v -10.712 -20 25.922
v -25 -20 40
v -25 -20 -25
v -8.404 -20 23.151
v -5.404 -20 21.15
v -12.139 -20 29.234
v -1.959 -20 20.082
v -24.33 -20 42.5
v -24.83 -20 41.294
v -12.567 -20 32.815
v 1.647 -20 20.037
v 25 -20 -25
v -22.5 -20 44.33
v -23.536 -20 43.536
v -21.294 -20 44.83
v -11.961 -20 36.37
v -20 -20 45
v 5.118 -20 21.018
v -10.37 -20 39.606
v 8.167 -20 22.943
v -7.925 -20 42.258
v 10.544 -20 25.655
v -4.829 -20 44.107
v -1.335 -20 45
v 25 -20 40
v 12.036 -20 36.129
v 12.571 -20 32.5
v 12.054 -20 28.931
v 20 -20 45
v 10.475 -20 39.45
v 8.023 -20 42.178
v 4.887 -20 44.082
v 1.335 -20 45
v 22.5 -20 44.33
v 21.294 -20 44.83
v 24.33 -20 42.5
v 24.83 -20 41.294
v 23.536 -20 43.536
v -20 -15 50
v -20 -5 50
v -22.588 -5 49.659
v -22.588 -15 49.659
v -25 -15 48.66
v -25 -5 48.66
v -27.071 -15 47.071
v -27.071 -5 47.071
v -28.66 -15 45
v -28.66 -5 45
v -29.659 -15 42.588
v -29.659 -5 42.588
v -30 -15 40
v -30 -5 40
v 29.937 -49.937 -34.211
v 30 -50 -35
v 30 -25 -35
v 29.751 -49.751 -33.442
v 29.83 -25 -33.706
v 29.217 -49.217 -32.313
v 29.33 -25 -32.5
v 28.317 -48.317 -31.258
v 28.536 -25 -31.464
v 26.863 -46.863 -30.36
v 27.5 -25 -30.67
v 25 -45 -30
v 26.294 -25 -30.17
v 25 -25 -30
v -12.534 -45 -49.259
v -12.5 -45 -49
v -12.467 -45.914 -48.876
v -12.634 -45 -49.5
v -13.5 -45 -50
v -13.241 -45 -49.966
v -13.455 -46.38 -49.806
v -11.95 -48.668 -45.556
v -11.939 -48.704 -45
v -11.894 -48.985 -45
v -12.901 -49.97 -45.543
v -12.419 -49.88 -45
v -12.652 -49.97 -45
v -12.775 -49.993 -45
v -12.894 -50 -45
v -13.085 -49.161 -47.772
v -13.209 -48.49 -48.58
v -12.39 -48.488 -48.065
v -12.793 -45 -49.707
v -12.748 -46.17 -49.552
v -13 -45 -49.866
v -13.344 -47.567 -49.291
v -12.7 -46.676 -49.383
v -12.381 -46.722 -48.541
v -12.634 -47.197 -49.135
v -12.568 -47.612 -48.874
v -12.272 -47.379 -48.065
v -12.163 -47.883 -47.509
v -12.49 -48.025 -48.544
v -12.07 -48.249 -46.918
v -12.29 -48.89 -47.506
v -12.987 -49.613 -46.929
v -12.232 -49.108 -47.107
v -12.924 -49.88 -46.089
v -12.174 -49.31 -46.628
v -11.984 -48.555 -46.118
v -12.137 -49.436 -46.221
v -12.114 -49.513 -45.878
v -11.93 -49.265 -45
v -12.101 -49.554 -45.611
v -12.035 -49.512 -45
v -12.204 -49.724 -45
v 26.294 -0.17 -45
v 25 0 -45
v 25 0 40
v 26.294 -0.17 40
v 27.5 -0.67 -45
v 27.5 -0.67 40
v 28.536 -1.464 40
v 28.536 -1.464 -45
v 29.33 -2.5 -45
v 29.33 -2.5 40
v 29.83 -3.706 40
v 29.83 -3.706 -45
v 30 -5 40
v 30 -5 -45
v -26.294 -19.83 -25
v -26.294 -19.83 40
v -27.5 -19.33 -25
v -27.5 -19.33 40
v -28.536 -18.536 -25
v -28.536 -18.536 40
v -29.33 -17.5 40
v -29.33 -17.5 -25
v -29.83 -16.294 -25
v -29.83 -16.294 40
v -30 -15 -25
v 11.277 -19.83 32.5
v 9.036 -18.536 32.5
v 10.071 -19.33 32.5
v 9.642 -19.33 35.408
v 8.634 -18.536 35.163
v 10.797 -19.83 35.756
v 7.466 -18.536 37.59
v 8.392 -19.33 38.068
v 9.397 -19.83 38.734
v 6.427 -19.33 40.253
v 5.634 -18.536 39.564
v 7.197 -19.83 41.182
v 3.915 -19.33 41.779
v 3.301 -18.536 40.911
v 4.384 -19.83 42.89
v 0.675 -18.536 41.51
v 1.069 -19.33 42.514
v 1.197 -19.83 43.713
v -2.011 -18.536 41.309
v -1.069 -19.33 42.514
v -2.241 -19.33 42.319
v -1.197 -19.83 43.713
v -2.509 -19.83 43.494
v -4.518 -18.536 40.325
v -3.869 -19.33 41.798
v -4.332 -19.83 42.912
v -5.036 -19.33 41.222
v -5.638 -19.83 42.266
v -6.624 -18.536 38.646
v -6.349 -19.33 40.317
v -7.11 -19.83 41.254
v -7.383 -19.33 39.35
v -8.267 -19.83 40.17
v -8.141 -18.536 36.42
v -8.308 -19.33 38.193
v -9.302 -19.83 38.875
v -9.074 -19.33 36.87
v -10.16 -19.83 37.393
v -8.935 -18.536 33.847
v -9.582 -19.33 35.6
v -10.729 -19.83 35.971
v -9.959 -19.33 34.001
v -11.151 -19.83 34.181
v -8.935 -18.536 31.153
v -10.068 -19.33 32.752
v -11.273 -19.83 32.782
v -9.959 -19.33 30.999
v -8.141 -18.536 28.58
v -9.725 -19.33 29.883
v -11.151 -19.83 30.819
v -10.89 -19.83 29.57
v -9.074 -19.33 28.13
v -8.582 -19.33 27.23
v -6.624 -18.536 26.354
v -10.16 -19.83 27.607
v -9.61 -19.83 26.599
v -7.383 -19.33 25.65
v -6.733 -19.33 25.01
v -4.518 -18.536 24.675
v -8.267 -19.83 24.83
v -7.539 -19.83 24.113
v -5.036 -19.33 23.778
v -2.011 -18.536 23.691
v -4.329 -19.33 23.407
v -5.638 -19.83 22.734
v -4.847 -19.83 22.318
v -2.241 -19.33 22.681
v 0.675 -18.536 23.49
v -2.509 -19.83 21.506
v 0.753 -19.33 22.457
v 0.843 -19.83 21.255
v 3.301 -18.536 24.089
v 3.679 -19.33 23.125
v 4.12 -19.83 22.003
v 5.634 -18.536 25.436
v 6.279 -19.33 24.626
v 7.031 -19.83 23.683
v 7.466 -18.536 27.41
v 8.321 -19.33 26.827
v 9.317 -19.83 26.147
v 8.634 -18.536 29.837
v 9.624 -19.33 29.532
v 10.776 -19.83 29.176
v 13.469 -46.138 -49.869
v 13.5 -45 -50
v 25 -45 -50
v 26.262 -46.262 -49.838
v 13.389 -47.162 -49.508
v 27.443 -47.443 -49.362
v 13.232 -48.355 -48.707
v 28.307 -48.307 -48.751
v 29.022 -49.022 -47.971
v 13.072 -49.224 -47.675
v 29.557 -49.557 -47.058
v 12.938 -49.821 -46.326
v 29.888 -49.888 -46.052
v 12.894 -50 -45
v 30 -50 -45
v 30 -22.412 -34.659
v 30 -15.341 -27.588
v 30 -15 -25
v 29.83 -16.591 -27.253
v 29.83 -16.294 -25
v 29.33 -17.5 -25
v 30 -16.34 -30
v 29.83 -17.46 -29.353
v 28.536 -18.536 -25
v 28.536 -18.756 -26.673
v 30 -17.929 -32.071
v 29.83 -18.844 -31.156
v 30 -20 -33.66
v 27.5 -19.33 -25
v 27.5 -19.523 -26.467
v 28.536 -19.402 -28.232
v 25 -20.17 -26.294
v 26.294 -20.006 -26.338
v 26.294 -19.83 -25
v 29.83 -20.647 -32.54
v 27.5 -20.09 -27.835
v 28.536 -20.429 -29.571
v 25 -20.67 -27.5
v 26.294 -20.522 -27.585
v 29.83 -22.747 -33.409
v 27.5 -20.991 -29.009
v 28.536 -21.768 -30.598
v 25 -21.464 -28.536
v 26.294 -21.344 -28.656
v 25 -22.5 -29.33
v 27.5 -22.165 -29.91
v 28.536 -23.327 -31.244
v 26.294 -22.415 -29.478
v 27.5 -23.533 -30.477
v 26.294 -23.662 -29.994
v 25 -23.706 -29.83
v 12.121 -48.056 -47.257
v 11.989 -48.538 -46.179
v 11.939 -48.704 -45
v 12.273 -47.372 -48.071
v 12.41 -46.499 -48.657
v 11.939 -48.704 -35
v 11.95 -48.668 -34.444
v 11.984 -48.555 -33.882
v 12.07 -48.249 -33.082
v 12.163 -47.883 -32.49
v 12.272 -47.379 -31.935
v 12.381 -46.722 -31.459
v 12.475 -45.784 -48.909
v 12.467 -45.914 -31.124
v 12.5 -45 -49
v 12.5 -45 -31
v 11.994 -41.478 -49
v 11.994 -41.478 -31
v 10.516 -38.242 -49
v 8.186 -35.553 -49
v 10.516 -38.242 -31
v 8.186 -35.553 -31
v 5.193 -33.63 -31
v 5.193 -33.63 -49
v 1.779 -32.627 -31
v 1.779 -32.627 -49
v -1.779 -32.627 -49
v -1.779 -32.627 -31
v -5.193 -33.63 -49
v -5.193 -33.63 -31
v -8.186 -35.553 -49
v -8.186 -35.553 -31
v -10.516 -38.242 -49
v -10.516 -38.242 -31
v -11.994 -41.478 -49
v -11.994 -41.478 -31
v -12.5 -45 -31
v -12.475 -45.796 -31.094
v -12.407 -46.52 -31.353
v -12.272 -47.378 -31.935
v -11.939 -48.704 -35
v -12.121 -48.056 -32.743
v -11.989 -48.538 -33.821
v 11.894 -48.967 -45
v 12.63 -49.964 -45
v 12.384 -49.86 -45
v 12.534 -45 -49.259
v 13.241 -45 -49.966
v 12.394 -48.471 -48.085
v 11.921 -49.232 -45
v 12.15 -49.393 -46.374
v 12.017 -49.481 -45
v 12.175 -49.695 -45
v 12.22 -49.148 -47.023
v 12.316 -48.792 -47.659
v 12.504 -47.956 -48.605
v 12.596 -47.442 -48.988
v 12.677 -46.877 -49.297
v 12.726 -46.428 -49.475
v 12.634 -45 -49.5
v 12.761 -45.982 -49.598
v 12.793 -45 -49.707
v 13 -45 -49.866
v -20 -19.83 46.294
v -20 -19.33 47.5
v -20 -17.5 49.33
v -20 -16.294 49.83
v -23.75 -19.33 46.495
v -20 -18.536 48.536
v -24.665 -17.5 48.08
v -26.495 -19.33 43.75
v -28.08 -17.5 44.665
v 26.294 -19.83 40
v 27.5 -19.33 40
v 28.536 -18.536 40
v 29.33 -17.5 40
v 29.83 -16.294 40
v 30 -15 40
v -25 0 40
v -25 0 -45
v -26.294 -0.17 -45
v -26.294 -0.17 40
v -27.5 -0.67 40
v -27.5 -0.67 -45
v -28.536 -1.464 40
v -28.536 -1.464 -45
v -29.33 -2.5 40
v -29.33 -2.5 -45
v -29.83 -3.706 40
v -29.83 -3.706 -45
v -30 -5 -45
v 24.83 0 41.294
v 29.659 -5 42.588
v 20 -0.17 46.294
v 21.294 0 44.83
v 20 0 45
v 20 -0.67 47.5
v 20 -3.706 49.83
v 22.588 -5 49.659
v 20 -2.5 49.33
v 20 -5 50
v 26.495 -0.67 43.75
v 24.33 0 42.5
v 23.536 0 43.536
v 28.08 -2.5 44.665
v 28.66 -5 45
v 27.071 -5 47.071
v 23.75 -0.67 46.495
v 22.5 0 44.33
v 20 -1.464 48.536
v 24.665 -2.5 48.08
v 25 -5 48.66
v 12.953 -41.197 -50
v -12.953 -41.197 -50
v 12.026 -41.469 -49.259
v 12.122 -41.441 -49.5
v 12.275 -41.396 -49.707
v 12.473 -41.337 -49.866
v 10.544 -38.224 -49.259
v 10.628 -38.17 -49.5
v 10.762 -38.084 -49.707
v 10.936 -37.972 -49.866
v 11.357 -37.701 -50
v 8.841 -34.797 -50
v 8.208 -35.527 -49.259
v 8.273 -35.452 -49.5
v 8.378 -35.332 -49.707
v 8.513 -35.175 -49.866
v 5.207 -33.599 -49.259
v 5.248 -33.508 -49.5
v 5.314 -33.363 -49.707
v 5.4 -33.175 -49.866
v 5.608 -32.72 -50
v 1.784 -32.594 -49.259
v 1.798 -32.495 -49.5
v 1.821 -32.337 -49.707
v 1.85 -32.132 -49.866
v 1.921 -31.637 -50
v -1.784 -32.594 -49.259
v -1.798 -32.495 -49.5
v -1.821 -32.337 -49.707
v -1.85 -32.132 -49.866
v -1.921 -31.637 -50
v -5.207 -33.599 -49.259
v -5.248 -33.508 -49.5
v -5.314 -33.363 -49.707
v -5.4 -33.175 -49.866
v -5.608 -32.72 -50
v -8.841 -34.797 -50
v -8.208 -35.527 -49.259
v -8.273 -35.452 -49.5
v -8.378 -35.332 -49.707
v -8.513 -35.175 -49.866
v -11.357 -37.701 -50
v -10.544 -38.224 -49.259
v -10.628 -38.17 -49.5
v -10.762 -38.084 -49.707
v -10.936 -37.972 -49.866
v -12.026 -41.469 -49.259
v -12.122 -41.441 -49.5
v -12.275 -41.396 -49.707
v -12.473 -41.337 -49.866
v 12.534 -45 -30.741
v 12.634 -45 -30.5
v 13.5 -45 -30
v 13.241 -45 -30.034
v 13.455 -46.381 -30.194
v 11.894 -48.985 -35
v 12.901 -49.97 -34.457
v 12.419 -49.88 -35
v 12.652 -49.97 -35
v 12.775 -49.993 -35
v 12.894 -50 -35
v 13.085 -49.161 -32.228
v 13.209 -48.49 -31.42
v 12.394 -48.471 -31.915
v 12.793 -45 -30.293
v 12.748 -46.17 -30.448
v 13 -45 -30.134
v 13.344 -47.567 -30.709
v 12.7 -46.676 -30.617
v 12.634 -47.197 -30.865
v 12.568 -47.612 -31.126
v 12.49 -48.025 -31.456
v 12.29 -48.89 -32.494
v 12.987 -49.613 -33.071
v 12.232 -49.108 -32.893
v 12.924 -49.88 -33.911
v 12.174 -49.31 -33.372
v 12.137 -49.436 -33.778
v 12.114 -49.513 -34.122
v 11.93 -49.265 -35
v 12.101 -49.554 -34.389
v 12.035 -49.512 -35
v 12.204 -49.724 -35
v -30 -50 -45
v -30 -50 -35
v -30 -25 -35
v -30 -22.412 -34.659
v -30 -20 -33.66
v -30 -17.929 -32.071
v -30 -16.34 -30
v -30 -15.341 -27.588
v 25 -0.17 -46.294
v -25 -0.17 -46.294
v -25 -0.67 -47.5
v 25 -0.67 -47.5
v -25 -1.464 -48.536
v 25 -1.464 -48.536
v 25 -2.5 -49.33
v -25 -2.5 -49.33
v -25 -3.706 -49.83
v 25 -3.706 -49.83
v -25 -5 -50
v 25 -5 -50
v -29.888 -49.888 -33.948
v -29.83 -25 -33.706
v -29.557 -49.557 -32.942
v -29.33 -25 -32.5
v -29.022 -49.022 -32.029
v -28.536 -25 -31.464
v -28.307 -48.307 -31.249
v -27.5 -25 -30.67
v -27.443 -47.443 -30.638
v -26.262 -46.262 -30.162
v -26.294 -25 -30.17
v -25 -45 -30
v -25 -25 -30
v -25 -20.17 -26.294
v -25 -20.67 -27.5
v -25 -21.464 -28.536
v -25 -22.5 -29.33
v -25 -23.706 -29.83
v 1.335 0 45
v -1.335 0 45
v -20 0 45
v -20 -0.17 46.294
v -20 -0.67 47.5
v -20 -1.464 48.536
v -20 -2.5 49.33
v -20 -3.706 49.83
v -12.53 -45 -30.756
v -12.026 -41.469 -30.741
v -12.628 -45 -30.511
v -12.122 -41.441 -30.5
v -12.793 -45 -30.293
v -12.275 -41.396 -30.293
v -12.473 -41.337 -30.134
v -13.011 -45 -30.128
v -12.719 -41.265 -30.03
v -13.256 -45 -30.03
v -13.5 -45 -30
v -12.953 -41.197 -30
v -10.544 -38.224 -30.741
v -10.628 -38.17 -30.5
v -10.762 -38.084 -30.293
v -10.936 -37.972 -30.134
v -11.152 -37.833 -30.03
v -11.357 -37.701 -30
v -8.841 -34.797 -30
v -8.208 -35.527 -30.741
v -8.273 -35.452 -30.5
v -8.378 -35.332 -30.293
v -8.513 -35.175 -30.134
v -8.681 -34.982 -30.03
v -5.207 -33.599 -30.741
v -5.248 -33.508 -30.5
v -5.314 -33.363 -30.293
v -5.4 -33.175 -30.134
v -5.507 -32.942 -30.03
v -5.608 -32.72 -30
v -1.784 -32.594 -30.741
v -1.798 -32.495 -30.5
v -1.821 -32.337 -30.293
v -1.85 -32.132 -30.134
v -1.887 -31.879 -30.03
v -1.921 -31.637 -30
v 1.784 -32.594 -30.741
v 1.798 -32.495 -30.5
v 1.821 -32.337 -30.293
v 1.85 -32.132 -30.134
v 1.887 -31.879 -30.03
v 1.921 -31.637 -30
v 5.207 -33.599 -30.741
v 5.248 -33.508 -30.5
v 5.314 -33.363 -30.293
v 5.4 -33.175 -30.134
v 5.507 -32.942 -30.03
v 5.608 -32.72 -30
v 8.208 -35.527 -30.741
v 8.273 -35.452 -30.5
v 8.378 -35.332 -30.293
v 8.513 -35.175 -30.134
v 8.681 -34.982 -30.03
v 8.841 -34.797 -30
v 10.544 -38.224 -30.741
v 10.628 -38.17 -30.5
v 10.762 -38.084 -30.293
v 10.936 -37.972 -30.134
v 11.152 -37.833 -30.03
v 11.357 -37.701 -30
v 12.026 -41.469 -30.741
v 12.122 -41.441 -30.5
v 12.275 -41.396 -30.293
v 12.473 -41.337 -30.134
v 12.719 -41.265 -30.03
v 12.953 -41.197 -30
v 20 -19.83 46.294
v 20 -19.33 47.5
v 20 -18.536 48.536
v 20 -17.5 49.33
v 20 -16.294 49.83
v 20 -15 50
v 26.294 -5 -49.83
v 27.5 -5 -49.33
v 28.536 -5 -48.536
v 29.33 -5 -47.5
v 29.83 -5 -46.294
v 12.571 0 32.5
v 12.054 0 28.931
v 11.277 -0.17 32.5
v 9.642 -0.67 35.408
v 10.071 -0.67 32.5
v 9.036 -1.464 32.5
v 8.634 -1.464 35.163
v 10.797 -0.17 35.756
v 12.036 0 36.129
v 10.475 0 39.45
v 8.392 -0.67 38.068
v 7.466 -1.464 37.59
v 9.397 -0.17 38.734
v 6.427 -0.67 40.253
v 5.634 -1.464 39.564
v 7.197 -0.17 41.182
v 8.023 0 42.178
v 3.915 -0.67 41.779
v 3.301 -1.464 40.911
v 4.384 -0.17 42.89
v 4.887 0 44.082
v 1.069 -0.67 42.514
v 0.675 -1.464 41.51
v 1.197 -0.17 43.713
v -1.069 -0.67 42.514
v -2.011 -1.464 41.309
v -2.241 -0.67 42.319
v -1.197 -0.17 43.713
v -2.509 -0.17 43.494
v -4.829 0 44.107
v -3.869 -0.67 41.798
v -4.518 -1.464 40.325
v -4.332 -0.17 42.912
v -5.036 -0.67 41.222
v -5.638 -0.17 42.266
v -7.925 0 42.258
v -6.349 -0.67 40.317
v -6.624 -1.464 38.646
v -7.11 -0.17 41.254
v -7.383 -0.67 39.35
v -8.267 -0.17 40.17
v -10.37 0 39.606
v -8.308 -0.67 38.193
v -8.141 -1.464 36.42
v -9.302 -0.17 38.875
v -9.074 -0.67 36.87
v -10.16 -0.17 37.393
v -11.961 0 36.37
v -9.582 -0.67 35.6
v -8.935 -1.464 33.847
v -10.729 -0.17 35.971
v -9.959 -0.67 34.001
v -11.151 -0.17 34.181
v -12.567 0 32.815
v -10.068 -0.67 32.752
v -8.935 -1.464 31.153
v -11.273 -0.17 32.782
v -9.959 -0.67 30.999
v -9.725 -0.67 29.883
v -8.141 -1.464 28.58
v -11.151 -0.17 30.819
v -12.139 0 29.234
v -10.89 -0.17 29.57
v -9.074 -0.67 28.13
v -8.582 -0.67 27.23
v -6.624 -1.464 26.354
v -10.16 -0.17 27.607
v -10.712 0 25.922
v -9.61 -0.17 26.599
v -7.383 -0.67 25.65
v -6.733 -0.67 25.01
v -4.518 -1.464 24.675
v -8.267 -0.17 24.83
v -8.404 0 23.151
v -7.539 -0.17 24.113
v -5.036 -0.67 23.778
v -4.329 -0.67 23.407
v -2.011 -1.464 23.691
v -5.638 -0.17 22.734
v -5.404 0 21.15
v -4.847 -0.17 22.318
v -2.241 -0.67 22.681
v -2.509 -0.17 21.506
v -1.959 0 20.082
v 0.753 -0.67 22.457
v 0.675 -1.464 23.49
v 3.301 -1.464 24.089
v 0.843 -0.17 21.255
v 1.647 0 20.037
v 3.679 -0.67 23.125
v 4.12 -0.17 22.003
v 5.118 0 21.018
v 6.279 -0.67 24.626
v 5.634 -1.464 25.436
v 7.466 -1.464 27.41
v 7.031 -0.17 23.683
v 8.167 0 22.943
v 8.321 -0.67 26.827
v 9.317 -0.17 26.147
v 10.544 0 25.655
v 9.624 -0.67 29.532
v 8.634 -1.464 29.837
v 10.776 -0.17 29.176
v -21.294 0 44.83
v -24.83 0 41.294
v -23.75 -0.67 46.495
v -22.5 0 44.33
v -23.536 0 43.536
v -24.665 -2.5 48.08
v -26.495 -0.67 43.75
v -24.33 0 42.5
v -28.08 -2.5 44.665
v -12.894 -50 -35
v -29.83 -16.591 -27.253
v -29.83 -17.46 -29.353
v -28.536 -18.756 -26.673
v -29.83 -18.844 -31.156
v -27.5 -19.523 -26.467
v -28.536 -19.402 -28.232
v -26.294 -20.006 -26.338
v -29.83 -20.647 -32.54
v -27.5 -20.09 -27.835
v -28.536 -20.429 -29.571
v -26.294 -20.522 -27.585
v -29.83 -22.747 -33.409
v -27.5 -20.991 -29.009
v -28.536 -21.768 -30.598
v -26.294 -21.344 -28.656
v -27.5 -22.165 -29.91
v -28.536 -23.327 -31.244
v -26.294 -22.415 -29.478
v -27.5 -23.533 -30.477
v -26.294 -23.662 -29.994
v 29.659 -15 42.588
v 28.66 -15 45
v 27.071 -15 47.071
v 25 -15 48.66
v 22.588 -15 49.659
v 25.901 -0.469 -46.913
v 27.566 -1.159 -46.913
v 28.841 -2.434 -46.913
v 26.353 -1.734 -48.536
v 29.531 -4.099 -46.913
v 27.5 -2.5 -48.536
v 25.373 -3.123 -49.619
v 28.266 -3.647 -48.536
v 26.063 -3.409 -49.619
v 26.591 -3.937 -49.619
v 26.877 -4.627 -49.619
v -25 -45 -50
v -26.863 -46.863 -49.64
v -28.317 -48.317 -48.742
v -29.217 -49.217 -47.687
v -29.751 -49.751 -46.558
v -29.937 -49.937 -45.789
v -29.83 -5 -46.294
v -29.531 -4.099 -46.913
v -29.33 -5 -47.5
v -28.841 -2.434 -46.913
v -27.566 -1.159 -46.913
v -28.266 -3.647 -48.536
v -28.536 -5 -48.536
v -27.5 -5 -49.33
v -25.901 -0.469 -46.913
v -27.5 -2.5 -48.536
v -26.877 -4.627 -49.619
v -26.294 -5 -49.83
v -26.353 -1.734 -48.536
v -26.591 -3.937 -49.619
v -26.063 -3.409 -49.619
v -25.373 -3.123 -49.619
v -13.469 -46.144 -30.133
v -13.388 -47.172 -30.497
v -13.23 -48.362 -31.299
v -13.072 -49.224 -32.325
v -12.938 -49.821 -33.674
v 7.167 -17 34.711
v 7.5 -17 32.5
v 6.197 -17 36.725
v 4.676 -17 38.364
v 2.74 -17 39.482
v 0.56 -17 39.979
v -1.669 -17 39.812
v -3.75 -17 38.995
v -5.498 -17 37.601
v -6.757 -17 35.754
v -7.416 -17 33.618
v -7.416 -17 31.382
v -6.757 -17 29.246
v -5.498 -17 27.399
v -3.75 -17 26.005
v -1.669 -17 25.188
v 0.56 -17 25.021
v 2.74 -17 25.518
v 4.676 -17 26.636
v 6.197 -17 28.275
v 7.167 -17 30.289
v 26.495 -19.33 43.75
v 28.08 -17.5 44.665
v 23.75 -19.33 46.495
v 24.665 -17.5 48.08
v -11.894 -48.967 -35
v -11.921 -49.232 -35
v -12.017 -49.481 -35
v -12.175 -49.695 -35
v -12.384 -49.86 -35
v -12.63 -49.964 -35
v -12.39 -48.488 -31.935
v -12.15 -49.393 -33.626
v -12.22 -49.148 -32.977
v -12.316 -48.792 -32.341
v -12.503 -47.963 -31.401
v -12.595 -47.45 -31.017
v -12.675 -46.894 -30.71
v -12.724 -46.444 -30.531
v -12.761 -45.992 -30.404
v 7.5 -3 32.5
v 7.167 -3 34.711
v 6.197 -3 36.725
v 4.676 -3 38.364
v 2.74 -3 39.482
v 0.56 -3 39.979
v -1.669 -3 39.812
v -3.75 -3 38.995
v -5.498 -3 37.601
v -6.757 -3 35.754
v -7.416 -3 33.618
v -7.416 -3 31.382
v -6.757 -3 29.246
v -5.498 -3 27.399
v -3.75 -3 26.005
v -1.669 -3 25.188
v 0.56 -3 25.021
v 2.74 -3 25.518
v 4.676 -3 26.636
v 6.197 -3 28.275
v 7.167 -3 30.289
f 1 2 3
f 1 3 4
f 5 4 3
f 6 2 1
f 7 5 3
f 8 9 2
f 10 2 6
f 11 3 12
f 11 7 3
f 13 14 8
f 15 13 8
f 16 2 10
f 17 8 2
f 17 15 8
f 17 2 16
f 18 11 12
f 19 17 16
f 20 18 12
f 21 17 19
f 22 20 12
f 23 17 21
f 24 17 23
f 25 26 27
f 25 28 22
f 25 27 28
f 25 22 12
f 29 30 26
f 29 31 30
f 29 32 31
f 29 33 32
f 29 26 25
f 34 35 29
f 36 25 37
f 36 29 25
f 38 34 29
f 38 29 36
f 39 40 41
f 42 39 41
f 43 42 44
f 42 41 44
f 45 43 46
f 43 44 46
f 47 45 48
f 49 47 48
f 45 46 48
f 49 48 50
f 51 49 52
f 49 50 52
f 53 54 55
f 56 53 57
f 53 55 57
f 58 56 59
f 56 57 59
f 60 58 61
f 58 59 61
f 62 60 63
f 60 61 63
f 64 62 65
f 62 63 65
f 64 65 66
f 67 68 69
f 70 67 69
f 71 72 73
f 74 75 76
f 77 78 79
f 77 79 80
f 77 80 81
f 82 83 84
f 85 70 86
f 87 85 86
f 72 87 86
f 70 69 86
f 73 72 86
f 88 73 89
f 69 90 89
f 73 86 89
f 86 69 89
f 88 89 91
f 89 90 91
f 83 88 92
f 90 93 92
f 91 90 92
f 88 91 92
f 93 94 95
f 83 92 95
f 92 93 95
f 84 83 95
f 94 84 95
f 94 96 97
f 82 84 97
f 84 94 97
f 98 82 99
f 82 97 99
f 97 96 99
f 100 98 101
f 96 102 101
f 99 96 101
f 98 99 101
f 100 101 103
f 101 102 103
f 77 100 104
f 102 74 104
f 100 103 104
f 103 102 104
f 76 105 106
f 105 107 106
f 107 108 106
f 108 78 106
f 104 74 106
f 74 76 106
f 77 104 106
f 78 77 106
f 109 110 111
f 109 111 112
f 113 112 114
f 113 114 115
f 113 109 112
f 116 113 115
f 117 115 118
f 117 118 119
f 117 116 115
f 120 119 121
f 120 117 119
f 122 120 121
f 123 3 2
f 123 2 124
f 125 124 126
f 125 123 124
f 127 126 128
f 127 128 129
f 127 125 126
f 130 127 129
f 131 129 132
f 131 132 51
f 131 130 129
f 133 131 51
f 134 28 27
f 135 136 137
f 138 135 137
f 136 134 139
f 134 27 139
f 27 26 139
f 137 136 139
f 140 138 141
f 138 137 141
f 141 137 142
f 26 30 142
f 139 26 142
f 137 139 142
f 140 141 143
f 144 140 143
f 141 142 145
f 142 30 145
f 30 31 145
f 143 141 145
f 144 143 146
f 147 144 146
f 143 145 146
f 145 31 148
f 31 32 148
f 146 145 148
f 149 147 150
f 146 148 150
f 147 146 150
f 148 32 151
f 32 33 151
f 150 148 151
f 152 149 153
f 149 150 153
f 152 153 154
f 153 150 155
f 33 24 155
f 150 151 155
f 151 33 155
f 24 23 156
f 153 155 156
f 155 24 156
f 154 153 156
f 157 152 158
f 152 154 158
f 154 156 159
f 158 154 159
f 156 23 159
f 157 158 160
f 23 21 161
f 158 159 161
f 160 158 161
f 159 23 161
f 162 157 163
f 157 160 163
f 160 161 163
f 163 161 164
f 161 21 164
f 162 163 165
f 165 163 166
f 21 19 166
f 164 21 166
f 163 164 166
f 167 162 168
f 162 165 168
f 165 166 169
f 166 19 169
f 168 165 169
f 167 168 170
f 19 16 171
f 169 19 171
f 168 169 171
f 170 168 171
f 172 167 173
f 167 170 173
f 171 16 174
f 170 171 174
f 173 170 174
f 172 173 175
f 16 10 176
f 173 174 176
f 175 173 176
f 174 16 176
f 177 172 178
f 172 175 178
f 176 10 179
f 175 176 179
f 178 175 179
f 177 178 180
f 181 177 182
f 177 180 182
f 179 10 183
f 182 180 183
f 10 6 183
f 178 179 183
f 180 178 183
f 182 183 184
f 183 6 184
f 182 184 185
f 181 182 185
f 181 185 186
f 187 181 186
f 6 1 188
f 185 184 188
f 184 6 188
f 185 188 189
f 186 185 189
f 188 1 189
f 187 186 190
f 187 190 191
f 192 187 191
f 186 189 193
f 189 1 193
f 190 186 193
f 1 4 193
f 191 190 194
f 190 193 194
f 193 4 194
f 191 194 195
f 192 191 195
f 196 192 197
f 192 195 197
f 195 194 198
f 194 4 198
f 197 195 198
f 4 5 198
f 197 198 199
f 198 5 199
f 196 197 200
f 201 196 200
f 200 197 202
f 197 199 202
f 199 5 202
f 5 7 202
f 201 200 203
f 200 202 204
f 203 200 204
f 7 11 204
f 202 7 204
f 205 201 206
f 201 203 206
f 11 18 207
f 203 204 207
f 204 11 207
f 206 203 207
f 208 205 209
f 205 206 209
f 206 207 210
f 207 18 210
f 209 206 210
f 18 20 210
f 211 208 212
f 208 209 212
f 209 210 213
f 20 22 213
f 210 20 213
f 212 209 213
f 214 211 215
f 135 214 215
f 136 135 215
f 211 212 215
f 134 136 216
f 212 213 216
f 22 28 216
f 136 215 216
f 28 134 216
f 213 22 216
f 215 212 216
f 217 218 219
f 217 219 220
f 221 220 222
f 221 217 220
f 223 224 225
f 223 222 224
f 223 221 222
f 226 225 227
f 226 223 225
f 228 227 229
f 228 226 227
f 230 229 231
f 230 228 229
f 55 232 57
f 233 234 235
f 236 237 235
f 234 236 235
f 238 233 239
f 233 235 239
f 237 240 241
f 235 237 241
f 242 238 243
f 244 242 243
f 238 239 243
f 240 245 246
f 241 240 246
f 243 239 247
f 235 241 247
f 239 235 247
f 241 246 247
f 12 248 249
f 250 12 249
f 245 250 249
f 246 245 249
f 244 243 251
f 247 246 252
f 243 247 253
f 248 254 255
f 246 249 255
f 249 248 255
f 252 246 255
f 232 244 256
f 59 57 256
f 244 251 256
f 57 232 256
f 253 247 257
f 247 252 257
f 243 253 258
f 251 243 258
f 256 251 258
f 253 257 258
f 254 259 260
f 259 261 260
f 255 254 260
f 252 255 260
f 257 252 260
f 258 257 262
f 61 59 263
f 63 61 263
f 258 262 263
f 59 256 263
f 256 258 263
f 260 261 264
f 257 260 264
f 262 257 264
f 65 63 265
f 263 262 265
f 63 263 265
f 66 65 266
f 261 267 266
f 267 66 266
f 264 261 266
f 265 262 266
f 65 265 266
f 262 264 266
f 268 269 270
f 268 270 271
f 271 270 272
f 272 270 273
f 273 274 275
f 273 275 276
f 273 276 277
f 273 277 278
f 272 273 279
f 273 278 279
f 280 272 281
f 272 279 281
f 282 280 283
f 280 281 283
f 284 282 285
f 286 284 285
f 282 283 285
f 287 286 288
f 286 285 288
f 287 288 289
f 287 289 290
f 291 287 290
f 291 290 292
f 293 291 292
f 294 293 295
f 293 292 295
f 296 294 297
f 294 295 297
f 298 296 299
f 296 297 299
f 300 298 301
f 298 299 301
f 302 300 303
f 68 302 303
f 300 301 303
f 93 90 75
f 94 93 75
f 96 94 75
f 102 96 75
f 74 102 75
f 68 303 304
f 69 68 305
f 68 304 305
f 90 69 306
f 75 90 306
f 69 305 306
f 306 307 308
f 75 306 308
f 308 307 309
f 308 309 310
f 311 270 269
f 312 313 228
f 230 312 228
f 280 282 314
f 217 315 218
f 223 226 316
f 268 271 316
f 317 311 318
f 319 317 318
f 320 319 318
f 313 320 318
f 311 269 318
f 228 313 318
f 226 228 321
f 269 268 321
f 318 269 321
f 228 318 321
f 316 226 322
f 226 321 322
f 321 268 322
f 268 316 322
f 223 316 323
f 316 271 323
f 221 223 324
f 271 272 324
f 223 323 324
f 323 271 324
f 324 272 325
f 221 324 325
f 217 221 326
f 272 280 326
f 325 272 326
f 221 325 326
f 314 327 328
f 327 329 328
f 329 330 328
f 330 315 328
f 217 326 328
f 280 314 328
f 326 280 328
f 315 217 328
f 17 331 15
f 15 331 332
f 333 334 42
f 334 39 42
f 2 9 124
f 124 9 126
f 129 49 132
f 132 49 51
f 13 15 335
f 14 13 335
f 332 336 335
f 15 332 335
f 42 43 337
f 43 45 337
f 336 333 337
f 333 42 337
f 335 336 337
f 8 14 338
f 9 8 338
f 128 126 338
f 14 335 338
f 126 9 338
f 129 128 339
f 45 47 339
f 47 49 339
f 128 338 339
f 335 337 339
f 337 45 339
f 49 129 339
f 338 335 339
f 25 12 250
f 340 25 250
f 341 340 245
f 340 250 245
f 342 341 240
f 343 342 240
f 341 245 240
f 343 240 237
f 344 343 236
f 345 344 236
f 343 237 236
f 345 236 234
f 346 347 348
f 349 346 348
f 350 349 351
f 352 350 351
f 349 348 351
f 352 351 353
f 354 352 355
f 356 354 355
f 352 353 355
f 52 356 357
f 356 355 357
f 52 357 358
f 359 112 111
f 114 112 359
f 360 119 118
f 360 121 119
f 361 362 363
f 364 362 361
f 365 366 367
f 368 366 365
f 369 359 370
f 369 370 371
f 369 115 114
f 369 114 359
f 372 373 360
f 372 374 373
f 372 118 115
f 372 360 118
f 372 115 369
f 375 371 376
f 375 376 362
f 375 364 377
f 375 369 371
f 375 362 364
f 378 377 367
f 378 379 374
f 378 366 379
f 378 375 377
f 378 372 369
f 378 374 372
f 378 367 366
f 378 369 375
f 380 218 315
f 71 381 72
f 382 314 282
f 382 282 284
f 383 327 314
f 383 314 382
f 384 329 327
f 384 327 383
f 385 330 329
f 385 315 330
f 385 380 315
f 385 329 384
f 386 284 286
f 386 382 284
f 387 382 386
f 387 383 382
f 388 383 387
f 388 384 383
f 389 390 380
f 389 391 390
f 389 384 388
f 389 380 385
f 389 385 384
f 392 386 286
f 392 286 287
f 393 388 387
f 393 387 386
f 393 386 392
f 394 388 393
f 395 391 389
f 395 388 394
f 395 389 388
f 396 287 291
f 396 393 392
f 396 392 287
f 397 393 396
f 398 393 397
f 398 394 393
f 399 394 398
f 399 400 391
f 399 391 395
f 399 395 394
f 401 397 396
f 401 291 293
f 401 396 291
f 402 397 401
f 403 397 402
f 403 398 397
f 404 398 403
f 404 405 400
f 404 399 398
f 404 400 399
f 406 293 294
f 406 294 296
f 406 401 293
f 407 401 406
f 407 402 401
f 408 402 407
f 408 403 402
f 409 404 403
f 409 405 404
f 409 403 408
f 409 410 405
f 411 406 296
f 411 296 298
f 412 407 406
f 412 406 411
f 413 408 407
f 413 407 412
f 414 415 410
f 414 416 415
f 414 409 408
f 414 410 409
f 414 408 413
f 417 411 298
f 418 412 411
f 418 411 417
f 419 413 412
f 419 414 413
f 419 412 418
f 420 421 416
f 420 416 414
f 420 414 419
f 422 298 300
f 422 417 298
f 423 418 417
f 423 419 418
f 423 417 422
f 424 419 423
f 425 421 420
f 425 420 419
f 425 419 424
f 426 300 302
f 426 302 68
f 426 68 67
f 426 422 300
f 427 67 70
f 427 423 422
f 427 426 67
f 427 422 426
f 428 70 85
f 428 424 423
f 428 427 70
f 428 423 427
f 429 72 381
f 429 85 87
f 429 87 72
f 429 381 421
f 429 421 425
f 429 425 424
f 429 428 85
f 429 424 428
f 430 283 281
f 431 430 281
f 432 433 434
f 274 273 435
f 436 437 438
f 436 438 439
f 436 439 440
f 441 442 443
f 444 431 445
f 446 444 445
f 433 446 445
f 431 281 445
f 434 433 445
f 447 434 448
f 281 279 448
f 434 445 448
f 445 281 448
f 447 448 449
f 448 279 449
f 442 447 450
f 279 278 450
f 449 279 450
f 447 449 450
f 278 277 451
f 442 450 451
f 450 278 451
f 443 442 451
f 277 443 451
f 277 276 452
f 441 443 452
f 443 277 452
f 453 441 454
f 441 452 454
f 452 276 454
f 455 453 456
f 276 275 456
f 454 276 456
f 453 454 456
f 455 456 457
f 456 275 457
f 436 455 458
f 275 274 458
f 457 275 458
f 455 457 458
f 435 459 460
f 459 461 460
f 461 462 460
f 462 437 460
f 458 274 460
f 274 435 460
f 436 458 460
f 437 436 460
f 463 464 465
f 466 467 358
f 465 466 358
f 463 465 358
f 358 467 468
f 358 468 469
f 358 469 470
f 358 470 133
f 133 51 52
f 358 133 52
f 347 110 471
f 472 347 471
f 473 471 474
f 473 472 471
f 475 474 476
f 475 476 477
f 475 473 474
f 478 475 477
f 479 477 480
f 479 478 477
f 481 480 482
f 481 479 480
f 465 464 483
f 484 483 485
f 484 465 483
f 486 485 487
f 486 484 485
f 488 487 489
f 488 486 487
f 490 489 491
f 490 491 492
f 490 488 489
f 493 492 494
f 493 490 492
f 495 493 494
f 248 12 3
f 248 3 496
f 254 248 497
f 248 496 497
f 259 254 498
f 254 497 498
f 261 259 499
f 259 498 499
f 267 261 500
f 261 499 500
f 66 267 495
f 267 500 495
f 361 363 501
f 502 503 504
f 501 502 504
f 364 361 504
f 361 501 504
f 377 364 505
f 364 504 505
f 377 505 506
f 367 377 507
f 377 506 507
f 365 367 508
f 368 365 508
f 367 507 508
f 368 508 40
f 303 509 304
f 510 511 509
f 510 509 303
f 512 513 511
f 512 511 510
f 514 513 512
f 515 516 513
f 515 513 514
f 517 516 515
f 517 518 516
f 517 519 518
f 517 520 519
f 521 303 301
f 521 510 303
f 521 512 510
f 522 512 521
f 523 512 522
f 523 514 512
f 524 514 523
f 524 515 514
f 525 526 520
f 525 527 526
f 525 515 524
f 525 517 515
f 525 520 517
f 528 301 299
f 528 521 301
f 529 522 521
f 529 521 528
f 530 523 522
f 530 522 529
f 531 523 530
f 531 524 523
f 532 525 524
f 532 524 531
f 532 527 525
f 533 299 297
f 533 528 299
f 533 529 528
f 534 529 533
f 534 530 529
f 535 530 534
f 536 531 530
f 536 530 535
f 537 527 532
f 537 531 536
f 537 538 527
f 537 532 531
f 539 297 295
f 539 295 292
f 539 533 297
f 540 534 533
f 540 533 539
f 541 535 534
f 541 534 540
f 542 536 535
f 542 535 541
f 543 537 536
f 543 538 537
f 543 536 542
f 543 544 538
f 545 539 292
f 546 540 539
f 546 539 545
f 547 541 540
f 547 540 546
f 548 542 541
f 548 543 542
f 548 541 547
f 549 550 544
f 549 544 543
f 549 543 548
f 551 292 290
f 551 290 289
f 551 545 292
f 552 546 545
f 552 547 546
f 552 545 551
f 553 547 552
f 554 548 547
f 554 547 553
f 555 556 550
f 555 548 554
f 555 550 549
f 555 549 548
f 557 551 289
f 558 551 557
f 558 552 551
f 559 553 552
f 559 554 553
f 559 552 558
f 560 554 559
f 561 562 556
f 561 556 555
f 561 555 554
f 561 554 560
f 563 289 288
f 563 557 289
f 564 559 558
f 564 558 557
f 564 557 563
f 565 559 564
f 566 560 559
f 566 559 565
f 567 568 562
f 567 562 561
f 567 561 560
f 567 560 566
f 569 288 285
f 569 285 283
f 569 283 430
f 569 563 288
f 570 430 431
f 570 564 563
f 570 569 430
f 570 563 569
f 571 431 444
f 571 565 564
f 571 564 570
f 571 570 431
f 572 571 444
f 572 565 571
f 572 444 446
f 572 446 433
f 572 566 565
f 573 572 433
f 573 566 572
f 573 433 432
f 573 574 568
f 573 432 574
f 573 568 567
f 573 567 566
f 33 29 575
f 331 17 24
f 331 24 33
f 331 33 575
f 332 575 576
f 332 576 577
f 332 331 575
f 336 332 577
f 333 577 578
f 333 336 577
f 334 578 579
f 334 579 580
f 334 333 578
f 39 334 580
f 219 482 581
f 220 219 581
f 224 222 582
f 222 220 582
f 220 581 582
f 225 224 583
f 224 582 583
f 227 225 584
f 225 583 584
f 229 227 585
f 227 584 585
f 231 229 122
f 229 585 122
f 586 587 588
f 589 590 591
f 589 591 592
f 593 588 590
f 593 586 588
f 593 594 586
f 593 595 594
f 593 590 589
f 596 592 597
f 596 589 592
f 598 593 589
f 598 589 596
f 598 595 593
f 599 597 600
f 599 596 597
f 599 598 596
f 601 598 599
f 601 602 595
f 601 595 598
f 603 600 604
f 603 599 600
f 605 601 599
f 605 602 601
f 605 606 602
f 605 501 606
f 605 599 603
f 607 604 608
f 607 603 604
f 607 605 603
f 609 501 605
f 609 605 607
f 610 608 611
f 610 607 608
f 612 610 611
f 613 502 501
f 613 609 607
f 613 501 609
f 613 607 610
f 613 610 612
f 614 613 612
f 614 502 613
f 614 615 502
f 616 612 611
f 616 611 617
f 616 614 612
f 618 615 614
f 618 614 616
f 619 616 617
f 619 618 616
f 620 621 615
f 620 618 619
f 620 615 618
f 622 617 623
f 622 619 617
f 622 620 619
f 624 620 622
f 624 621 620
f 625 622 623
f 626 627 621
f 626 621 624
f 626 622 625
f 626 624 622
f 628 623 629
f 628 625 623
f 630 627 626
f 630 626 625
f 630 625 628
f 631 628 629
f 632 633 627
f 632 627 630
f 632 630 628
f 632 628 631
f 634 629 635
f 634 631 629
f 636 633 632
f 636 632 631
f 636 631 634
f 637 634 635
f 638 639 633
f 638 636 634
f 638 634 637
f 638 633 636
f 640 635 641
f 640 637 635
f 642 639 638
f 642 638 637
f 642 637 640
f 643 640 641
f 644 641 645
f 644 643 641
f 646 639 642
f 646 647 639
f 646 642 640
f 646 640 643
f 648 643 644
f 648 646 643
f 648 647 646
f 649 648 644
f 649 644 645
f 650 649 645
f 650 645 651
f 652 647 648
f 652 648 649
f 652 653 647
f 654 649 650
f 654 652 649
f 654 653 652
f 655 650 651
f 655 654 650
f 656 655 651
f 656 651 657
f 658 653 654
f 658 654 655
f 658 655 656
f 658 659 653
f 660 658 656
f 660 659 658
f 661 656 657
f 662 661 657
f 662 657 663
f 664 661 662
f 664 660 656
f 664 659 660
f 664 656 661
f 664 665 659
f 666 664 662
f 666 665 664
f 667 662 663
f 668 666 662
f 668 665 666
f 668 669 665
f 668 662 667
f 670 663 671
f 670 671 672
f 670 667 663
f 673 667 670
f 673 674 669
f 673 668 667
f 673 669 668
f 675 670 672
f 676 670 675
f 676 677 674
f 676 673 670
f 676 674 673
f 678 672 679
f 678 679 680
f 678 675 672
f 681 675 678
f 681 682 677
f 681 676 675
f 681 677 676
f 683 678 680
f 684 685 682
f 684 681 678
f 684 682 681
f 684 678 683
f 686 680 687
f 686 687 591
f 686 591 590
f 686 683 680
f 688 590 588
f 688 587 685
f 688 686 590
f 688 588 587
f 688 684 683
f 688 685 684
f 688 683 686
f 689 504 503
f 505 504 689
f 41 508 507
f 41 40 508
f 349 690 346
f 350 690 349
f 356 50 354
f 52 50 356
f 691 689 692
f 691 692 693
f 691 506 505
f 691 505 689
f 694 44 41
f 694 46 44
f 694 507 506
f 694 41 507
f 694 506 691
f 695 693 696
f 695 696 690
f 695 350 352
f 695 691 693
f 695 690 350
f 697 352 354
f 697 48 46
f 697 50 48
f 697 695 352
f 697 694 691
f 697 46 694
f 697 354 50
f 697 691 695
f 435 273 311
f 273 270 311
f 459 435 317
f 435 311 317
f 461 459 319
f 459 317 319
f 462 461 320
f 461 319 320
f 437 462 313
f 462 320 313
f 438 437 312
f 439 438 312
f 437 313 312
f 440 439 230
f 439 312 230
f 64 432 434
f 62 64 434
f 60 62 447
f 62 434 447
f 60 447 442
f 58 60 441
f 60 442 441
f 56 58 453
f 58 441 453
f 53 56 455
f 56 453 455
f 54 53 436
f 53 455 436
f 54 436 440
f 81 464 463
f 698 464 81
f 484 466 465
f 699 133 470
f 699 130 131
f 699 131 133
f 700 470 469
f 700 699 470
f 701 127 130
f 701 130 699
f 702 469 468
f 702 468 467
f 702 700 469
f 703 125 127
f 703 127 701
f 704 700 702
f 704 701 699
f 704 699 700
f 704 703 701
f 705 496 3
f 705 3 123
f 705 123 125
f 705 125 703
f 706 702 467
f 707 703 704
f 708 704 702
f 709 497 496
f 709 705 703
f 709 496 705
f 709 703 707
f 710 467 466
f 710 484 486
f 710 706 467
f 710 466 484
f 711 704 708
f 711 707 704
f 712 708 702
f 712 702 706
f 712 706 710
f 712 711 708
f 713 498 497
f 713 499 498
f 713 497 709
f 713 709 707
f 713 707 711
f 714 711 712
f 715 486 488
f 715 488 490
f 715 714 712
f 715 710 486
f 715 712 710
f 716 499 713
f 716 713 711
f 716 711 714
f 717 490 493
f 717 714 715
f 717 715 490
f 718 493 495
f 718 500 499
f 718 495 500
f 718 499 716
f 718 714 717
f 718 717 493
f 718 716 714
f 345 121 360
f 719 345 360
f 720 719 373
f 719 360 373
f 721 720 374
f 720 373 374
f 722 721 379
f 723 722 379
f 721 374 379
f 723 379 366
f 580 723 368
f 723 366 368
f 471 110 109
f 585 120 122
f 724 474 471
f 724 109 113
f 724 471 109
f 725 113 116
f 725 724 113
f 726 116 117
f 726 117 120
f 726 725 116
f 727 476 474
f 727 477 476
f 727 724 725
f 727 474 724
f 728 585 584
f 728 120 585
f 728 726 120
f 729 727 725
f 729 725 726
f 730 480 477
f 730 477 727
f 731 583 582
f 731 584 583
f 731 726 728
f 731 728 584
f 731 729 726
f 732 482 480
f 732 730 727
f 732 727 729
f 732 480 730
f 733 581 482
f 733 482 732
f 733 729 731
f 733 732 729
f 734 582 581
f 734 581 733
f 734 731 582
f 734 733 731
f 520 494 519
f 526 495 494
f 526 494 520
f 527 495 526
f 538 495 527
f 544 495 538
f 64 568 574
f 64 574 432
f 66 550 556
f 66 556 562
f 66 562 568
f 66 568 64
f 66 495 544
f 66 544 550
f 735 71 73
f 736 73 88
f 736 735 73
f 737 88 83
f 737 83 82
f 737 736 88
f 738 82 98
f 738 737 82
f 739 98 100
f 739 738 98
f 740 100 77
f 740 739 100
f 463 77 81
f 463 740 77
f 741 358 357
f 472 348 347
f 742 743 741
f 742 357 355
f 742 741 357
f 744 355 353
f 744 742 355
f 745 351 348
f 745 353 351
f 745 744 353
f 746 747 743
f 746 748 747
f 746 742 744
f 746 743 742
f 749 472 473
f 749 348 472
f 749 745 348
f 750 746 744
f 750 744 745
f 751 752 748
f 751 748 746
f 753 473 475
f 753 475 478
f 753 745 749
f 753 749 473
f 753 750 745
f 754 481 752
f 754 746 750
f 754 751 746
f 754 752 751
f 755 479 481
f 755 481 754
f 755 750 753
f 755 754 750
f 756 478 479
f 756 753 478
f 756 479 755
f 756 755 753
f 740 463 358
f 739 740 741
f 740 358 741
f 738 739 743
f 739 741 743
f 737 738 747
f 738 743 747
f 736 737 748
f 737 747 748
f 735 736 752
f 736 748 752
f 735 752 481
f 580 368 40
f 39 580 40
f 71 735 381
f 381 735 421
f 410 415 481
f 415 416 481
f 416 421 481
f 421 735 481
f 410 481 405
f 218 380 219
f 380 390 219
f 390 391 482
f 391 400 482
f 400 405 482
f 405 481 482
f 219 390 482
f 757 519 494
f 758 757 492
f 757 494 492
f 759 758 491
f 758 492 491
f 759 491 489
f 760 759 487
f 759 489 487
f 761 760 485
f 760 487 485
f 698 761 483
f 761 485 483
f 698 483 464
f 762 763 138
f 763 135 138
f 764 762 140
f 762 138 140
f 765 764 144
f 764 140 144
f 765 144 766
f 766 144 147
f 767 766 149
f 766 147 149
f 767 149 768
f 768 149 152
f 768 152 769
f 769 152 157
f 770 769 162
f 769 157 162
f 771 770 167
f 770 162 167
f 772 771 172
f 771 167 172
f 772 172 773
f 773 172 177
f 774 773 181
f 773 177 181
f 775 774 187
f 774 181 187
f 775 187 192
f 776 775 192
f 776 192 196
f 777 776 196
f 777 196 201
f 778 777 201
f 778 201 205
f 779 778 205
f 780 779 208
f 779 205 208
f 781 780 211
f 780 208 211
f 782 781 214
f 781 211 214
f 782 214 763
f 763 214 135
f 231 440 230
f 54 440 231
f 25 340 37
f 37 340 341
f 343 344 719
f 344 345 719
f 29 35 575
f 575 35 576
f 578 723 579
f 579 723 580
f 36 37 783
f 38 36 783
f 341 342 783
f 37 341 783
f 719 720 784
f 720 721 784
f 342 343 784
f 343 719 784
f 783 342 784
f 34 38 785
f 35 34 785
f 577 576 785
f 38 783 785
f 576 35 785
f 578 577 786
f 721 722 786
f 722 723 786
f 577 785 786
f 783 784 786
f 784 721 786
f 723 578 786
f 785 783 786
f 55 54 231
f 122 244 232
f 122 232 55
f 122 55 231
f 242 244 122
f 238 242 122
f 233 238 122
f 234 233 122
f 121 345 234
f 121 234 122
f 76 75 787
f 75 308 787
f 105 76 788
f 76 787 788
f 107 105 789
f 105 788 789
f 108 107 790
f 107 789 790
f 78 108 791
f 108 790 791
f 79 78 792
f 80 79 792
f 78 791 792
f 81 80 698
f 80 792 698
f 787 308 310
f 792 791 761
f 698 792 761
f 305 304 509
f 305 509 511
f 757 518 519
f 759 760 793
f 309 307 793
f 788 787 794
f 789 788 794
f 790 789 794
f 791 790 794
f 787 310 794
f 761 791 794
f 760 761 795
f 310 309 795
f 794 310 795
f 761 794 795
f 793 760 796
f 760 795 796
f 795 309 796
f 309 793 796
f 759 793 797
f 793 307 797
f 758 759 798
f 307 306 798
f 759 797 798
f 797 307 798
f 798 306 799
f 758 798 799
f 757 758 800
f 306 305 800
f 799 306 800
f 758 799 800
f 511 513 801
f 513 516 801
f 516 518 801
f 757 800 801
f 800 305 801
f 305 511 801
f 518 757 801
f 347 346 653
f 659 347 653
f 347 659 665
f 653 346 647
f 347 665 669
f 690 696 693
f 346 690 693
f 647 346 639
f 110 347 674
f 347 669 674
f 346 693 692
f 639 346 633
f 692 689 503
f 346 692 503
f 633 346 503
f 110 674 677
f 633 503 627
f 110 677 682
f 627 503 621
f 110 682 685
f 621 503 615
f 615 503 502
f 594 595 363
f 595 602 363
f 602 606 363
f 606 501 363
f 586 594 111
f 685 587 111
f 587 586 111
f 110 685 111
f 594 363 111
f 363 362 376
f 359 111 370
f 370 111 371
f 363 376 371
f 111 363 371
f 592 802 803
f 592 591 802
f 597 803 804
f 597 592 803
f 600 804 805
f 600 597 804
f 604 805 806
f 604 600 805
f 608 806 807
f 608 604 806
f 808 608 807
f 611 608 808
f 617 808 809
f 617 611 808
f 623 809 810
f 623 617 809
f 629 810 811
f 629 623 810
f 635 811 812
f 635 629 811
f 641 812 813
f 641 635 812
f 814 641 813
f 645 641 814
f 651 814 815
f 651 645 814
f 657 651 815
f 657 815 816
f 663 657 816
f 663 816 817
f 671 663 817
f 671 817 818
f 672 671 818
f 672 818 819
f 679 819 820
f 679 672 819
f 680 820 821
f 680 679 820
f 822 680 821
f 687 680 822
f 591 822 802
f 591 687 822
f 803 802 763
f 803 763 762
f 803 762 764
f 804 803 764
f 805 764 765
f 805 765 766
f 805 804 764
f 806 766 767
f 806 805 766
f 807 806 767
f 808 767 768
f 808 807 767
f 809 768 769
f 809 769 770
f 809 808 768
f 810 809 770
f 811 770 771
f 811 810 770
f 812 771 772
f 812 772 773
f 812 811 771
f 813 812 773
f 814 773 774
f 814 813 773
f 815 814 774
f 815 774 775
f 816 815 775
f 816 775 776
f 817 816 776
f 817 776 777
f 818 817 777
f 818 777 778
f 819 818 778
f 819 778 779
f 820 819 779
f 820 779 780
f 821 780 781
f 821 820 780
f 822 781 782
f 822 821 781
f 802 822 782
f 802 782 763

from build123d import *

# Parameters (mm, degrees)
F0_R         = 7.5
F1_DEPTH     = 20
F2_SIZE      = 3
F3_W         = 60
F3_H         = 20
F4_DEPTH     = 30
F5_T1_DEPTH  = 60
F5_T3_DEPTH  = 65
F5_T5_DEPTH  = 40
F5_T7_DEPTH  = 37.5
F5_T9_DEPTH  = 85
F5_T12_ANGLE = 90
F5_T14_ANGLE = 90
F5_T18_ANGLE = 90
F5_T20_ANGLE = 90
F6_T1_DEPTH  = 40
F6_T3_DEPTH  = 85
F6_T5_DEPTH  = 50
F6_T7_DEPTH  = 57.5
F6_T9_DEPTH  = 85
F6_S13_W     = 5
F6_S13_H     = 5
F6_T14_DEPTH = 5
F6_S19_W     = 5
F6_S19_H     = 5
F6_T20_DEPTH = 5
F6_T26_ANGLE = 90
F6_T28_ANGLE = 90
F8_DEPTH     = 20.001
F9_R         = 1


# Not quite as in the source:
# - a fillet or chamfer that OpenCascade refuses, or shapes differently, is made with other operations: its cross-section is extruded or revolved along the edge and cut away or added


with BuildPart() as f1:
    # F0 (on Front) → F1 (new body)
    with BuildSketch(Plane.XZ):
        with BuildLine():
            Line((20, 50), (-20, 50))
            ThreePointArc((-20, 50), (-27.0710678119, 47.0710678119), (-30, 40))
            Line((-30, 40), (-30, -50))
            Line((-30, -50), (30, -50))
            Line((30, -50), (30, 40))
            ThreePointArc((30, 40), (27.0710678119, 47.0710678119), (20, 50))
        make_face()
        with Locations((0, 32.5)):
            Circle(F0_R, mode=Mode.SUBTRACT)
    extrude(amount=F1_DEPTH)

    # F2
    f2_edges = [f1.edges().sort_by_distance(p)[0] for p in [
        (7.5, -10, 32.5),
        (-7.5, 0, 32.5),
        (-7.5, -20, 32.5),
    ]]
    chamfer(f2_edges, length=F2_SIZE)

    # F3 (on face) → F4 (join)
    with BuildSketch(Plane.XZ.offset(20)):
        with Locations((0, -40)):
            Rectangle(F3_W, F3_H)
    extrude(amount=F4_DEPTH)

    # F5: fillet of radius 5 on 10 edges, made by hand

    # F5_s2 → F5_t1 (join)
    with BuildSketch(Plane.YZ.offset(-30)):
        with BuildLine():
            ThreePointArc((-20, -25), (-21.4644660941, -28.5355339059), (-25, -30))
            Line((-25, -30), (-20, -30))
            Line((-20, -30), (-20, -25))
        make_face()
    extrude(amount=F5_T1_DEPTH)

    # F5_s4 → F5_t3 (cut)
    with BuildSketch(Plane.XY.offset(-25)):
        with BuildLine():
            ThreePointArc((25, -20), (28.5355339059, -18.5355339059), (30, -15))
            Line((30, -15), (30, -20))
            Line((30, -20), (25, -20))
        make_face()
        with BuildLine():
            ThreePointArc((-25, -20), (-28.5355339059, -18.5355339059), (-30, -15))
            Line((-30, -15), (-30, -20))
            Line((-30, -20), (-25, -20))
        make_face()
    extrude(amount=F5_T3_DEPTH, mode=Mode.SUBTRACT)

    # F5_s6 → F5_t5 (cut)
    with BuildSketch(Plane.YZ.offset(-20)):
        with BuildLine():
            ThreePointArc((-20, 45), (-18.5355339059, 48.5355339059), (-15, 50))
            Line((-15, 50), (-20, 50))
            Line((-20, 50), (-20, 45))
        make_face()
    extrude(amount=F5_T5_DEPTH, mode=Mode.SUBTRACT)

    # F5_s8 → F5_t7 (cut)
    with BuildSketch(Plane.XZ.offset(25)):
        with BuildLine():
            ThreePointArc((30, -35), (28.5355339059, -31.4644660941), (25, -30))
            Line((25, -30), (30, -30))
            Line((30, -30), (30, -35))
        make_face()
        with BuildLine():
            ThreePointArc((-30, -35), (-28.5355339059, -31.4644660941), (-25, -30))
            Line((-25, -30), (-30, -30))
            Line((-30, -30), (-30, -35))
        make_face()
    extrude(amount=F5_T7_DEPTH, mode=Mode.SUBTRACT)

    # F5_s10 → F5_t9 (cut)
    with BuildSketch(Plane.YZ.offset(-42.5)):
        with BuildLine():
            ThreePointArc((-45, -30), (-48.5355339059, -31.4644660941), (-50, -35))
            Line((-50, -35), (-50, -30))
            Line((-50, -30), (-45, -30))
        make_face()
    extrude(amount=F5_T9_DEPTH, mode=Mode.SUBTRACT)

    # F5_s11 → F5_t12 (revolve, cut)
    with BuildSketch(Plane.XY.offset(40)):
        with BuildLine():
            ThreePointArc((25, -20), (28.5355339059, -18.5355339059), (30, -15))
            Line((30, -15), (30, -20))
            Line((30, -20), (25, -20))
        make_face()
    revolve(axis=Axis((20, -20, 40), (0, -1, 0)), revolution_arc=F5_T12_ANGLE, mode=Mode.SUBTRACT)

    # F5_s13 → F5_t14 (revolve, cut)
    with BuildSketch(Plane.YZ.offset(-20)):
        with BuildLine():
            ThreePointArc((-20, 45), (-18.5355339059, 48.5355339059), (-15, 50))
            Line((-15, 50), (-20, 50))
            Line((-20, 50), (-20, 45))
        make_face()
    revolve(axis=Axis((-20, -20, 40), (0, -1, 0)), revolution_arc=F5_T14_ANGLE, mode=Mode.SUBTRACT)

    # F5_s15 → F5_t16 (revolve, cut)
    with BuildSketch(Plane.XY.offset(32.5)):
        with BuildLine():
            ThreePointArc((9.0355339059, -18.5355339059), (10.65765065, -19.6193976626), (12.5710678119, -20))
            Line((12.5710678119, -20), (10.5, -20))
            Line((10.5, -20), (9.0355339059, -18.5355339059))
        make_face()
    revolve(axis=Axis((0, -20, 32.5), (0, -1, 0)), mode=Mode.SUBTRACT)

    # F5_s17 → F5_t18 (revolve, cut)
    with BuildSketch(Plane.XY.offset(-25)):
        with BuildLine():
            ThreePointArc((-30, -15), (-28.5355339059, -18.5355339059), (-25, -20))
            Line((-25, -20), (-30, -20))
            Line((-30, -20), (-30, -15))
        make_face()
    revolve(axis=Axis((-30, -25, -25), (-1, 0, 0)), revolution_arc=F5_T18_ANGLE, mode=Mode.SUBTRACT)

    # F5_s19 → F5_t20 (revolve, cut)
    with BuildSketch(Plane.XY.offset(-25)):
        with BuildLine():
            ThreePointArc((30, -15), (28.5355339059, -18.5355339059), (25, -20))
            Line((25, -20), (30, -20))
            Line((30, -20), (30, -15))
        make_face()
    revolve(axis=Axis((30, -25, -25), (-1, 0, 0)), revolution_arc=F5_T20_ANGLE, mode=Mode.SUBTRACT)

    # F6: fillet of radius 5 on 10 edges, made by hand

    # F6_s2 → F6_t1 (cut)
    with BuildSketch(Plane.YZ.offset(-20)):
        with BuildLine():
            ThreePointArc((0, 45), (-1.4644660941, 48.5355339059), (-5, 50))
            Line((-5, 50), (0, 50))
            Line((0, 50), (0, 45))
        make_face()
    extrude(amount=F6_T1_DEPTH, mode=Mode.SUBTRACT)

    # F6_s4 → F6_t3 (cut)
    with BuildSketch(Plane.XY.offset(-45)):
        with BuildLine():
            ThreePointArc((-25, 0), (-28.5355339059, -1.4644660941), (-30, -5))
            Line((-30, -5), (-30, 0))
            Line((-30, 0), (-25, 0))
        make_face()
        with BuildLine():
            ThreePointArc((25, 0), (28.5355339059, -1.4644660941), (30, -5))
            Line((30, -5), (30, 0))
            Line((30, 0), (25, 0))
        make_face()
    extrude(amount=F6_T3_DEPTH, mode=Mode.SUBTRACT)

    # F6_s6 → F6_t5 (cut)
    with BuildSketch(Plane.YZ.offset(-25)):
        with BuildLine():
            ThreePointArc((0, -45), (-1.4644660941, -48.5355339059), (-5, -50))
            Line((-5, -50), (0, -50))
            Line((0, -50), (0, -45))
        make_face()
    extrude(amount=F6_T5_DEPTH, mode=Mode.SUBTRACT)

    # F6_s8 → F6_t7 (cut)
    with BuildSketch(Plane.XZ.offset(5)):
        with BuildLine():
            ThreePointArc((-30, -45), (-28.5355339059, -48.5355339059), (-25, -50))
            Line((-25, -50), (-30, -50))
            Line((-30, -50), (-30, -45))
        make_face()
        with BuildLine():
            ThreePointArc((25, -50), (28.5355339059, -48.5355339059), (30, -45))
            Line((30, -45), (30, -50))
            Line((30, -50), (25, -50))
        make_face()
    extrude(amount=F6_T7_DEPTH, mode=Mode.SUBTRACT)

    # F6_s10 → F6_t9 (cut)
    with BuildSketch(Plane.YZ.offset(-42.5)):
        with BuildLine():
            ThreePointArc((-45, -50), (-48.5355339059, -48.5355339059), (-50, -45))
            Line((-50, -45), (-50, -50))
            Line((-50, -50), (-45, -50))
        make_face()
    extrude(amount=F6_T9_DEPTH, mode=Mode.SUBTRACT)


with BuildPart() as f6_tool12:
    # F6_s13 → F6_t14 (new body)
    with BuildSketch(Plane.XY.offset(-45)):
        with Locations((-27.5, -2.5)):
            Rectangle(F6_S13_W, F6_S13_H)
    extrude(amount=-F6_T14_DEPTH)

    # F6_s15 → F6_t16 (revolve, cut)
    with BuildSketch(Plane(origin=(-25, -5, -45), x_dir=(0.7071067812, -0.7071067812, 0), z_dir=(0.7071067812, 0.7071067812, 0))):
        with BuildLine():
            ThreePointArc((0, -5), (5, 0), (0, 5))
            Line((0, 5), (0, -5))
        make_face()
    revolve(axis=Axis((-25, -5, -45), (0, 0, -1)), mode=Mode.SUBTRACT)


with BuildPart() as f1_1:
    add(f1.part)

    # F6_t11: cut F6_tool12
    add(f6_tool12.part, mode=Mode.SUBTRACT)


with BuildPart() as f6_tool18:
    # F6_s19 → F6_t20 (new body)
    with BuildSketch(Plane.XY.offset(-45)):
        with Locations((27.5, -2.5)):
            Rectangle(F6_S19_W, F6_S19_H)
    extrude(amount=-F6_T20_DEPTH)

    # F6_s21 → F6_t22 (revolve, cut)
    with BuildSketch(Plane(origin=(25, -5, -45), x_dir=(-0.7071067812, -0.7071067812, 0), z_dir=(0.7071067812, -0.7071067812, 0))):
        with BuildLine():
            ThreePointArc((0, -5), (5, 0), (0, 5))
            Line((0, 5), (0, -5))
        make_face()
    revolve(axis=Axis((25, -5, -45), (0, 0, -1)), mode=Mode.SUBTRACT)


with BuildPart() as f1_2:
    add(f1_1.part)

    # F6_t17: cut F6_tool18
    add(f6_tool18.part, mode=Mode.SUBTRACT)

    # F6_s23 → F6_t24 (revolve, cut)
    with BuildSketch(Plane.XY.offset(32.5)):
        with BuildLine():
            ThreePointArc((9.0355339059, -1.4644660941), (10.65765065, -0.3806023374), (12.5710678119, 0))
            Line((12.5710678119, 0), (10.5, 0))
            Line((10.5, 0), (9.0355339059, -1.4644660941))
        make_face()
    revolve(axis=Axis((0, 0, 32.5), (0, -1, 0)), mode=Mode.SUBTRACT)

    # F6_s25 → F6_t26 (revolve, cut)
    with BuildSketch(Plane.YZ.offset(-20)):
        with BuildLine():
            ThreePointArc((0, 45), (-1.4644660941, 48.5355339059), (-5, 50))
            Line((-5, 50), (0, 50))
            Line((0, 50), (0, 45))
        make_face()
    revolve(axis=Axis((-20, 0, 40), (0, -1, 0)), revolution_arc=F6_T26_ANGLE, mode=Mode.SUBTRACT)

    # F6_s27 → F6_t28 (revolve, cut)
    with BuildSketch(Plane.XY.offset(40)):
        with BuildLine():
            ThreePointArc((25, 0), (28.5355339059, -1.4644660941), (30, -5))
            Line((30, -5), (30, 0))
            Line((30, 0), (25, 0))
        make_face()
    revolve(axis=Axis((20, 0, 40), (0, -1, 0)), revolution_arc=F6_T28_ANGLE, mode=Mode.SUBTRACT)

    # F7 (on face) → F8 (cut, through all)
    with BuildSketch(Plane.XY.offset(-30)):
        with BuildLine():
            Line((-12.5, -45), (12.5, -45))
            ThreePointArc((12.5, -45), (0, -32.5), (-12.5, -45))
        make_face()
        with BuildLine():
            ThreePointArc((-12.5, -45), (0, -57.5), (12.5, -45))
            Line((12.5, -45), (-12.5, -45))
        make_face()
    extrude(amount=-F8_DEPTH, mode=Mode.SUBTRACT)

    # F9
    f9_edges = [f1_2.edges().sort_by_distance(p)[0] for p in [
        (0, -32.5, -50),
        (-11.98926, -48.536614, -48.534454),
        (-11.456439, -50, -40),
        (-11.98926, -48.536614, -31.465546),
        (0, -32.5, -30),
        (11.98926, -48.536614, -31.465546),
        (11.456439, -50, -40),
        (11.98926, -48.536614, -48.534454),
    ]]
    fillet(f9_edges, radius=F9_R)


solid = f1_2.part
